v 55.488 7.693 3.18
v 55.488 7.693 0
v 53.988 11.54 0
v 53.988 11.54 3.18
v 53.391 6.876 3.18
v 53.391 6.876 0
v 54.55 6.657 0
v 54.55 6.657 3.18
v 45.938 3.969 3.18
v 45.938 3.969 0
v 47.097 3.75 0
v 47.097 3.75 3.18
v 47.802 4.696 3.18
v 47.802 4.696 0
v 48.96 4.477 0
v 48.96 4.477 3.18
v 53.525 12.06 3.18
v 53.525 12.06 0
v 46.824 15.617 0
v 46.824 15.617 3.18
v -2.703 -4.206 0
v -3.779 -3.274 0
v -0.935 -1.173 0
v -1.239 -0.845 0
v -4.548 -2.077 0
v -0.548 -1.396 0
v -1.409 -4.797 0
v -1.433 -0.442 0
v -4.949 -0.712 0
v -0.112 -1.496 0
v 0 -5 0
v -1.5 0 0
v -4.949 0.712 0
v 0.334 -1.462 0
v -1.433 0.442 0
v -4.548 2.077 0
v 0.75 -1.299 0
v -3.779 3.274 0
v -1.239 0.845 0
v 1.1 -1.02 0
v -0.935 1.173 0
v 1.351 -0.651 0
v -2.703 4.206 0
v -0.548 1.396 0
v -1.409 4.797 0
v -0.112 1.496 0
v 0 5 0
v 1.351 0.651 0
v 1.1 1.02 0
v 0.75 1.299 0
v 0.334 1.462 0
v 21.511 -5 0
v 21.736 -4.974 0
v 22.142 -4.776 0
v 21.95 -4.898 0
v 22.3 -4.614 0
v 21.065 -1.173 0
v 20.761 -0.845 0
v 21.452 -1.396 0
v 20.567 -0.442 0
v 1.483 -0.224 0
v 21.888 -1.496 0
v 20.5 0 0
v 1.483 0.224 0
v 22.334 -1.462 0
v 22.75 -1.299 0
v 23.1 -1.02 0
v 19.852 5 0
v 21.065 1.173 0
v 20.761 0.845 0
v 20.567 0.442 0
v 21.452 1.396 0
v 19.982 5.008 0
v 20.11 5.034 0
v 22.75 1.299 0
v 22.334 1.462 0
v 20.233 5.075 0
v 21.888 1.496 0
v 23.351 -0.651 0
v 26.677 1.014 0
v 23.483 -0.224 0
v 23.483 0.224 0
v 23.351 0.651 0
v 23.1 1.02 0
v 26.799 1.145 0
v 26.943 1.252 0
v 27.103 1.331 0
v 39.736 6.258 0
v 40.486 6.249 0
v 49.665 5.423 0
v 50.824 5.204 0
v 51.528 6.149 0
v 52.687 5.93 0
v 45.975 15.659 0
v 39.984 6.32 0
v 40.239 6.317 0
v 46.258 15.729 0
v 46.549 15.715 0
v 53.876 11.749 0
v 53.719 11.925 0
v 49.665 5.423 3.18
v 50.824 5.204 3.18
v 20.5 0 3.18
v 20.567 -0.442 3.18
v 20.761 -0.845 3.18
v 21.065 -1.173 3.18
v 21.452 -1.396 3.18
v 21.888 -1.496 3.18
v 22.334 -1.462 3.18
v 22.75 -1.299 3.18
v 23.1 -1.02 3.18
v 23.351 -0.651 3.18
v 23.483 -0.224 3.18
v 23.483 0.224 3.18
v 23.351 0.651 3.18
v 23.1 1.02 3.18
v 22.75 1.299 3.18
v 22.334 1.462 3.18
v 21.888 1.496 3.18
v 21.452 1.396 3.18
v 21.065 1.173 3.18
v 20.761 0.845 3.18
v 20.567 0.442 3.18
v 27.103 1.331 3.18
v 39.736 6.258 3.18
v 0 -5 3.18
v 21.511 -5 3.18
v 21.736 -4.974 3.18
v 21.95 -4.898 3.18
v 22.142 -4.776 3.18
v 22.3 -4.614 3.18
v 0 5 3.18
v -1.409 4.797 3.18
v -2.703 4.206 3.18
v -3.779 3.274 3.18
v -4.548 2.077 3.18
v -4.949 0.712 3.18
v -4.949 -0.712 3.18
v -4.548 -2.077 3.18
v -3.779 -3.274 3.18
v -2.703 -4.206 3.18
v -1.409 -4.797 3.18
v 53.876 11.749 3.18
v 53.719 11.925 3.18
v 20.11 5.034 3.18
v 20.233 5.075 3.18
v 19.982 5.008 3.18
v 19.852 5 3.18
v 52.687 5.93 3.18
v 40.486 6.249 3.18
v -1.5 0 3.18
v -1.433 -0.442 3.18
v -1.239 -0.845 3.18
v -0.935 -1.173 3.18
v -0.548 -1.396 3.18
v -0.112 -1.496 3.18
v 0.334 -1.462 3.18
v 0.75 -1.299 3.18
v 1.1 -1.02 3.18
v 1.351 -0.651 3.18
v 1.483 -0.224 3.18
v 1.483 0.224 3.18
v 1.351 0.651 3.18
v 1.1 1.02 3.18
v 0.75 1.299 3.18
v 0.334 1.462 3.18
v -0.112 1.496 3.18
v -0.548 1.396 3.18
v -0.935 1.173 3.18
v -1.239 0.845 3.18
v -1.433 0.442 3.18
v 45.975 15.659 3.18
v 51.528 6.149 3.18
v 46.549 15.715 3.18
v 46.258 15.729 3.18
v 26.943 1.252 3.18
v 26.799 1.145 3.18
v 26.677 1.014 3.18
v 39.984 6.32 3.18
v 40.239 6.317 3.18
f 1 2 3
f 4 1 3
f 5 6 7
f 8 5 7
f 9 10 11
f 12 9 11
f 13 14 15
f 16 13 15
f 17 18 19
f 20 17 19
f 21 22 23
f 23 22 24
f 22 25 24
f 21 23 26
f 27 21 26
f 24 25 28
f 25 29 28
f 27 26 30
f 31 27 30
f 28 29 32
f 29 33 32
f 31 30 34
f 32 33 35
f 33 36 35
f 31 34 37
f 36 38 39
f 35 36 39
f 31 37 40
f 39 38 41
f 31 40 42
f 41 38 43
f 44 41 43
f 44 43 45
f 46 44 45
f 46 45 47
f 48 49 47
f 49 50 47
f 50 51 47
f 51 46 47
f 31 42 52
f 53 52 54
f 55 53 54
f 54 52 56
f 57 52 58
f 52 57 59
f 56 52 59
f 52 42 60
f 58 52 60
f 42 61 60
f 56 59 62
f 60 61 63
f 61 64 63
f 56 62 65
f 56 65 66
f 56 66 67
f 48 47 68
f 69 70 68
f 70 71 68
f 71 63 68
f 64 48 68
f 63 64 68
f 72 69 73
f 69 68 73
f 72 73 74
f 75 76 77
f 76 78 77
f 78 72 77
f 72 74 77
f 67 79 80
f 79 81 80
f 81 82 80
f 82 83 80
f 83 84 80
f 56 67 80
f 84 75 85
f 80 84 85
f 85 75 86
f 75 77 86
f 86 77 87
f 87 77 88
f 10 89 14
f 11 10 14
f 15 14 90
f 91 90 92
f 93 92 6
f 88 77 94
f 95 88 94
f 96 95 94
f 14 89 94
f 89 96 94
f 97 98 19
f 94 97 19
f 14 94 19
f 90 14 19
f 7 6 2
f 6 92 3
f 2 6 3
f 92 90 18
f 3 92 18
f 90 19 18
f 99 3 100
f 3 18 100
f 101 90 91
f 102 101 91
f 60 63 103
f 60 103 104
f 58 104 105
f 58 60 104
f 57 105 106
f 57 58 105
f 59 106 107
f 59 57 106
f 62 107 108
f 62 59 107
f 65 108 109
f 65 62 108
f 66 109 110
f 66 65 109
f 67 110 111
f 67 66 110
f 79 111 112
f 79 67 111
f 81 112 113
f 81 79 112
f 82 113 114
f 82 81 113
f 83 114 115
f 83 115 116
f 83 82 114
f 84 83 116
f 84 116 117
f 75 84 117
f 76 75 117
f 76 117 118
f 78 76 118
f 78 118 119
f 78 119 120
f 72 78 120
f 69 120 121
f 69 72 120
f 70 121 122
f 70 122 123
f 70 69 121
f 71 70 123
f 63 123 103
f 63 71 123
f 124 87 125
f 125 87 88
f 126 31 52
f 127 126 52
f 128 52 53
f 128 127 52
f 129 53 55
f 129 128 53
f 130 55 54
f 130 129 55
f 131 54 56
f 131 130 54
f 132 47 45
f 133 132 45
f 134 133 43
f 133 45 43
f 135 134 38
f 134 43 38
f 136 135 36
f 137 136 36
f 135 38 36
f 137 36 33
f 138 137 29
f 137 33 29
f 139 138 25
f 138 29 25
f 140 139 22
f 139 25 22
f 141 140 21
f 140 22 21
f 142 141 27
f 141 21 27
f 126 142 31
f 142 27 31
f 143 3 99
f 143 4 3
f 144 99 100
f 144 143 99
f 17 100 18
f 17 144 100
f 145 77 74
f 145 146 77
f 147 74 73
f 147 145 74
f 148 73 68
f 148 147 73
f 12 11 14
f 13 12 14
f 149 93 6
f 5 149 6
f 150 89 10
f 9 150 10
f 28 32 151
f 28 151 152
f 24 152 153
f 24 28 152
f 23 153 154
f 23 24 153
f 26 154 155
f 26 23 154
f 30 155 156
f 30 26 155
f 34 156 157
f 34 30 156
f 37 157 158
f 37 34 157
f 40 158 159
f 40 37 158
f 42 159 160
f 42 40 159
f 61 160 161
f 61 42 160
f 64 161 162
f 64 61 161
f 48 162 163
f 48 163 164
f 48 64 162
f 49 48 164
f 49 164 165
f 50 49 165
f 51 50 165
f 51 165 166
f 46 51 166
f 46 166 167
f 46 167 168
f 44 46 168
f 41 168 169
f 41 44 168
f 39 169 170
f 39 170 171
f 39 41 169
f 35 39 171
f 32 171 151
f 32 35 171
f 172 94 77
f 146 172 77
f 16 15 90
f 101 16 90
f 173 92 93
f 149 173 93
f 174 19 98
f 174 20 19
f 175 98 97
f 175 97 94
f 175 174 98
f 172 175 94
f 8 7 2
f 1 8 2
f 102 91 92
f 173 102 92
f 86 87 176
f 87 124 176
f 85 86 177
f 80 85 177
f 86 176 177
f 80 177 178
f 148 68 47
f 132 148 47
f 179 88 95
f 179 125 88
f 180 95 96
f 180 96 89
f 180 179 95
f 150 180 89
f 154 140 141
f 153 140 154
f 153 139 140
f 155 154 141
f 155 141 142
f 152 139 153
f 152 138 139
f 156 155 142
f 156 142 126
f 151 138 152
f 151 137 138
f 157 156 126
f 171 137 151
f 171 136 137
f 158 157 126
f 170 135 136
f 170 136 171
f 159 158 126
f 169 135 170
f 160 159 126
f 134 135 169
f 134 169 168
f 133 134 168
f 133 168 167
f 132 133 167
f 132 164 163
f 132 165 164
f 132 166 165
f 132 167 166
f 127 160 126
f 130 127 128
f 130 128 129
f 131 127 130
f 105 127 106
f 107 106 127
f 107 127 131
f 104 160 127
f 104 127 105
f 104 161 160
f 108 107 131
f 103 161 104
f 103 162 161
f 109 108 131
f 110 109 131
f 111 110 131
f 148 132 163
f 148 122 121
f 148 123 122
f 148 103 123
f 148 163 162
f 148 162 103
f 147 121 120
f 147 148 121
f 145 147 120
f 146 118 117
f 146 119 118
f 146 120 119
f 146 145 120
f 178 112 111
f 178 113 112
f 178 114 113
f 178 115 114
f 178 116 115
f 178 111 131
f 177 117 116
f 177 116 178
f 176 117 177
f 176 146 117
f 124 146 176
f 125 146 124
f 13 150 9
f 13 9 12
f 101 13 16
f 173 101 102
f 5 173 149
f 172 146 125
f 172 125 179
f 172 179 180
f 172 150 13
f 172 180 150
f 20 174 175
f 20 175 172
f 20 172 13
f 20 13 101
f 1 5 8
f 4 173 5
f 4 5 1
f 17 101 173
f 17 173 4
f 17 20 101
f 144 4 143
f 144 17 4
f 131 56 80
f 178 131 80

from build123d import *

# Parameters (mm, degrees)
SKETCH2_R           = 1.5
BOSS_EXTRUDE1_DEPTH = 3.18
FILLET1_R           = 1


with BuildPart() as part:
    # Sketch2 → Boss-Extrude1 (new body)
    # profile 1 of 7: a face of its own
    with BuildSketch(Plane.XY):
        with BuildLine():
            Line((20.05, 5), (0, 5))
            ThreePointArc((0, 5), (-5, 0), (0, -5))
            Line((0, -5), (22, -5))
            Line((22, -5), (26.846033211, 1.231244133))
            ThreePointArc((26.846033211, 1.231244133), (25.069509679, 3.946911493), (22, 5))
            Line((22, 5), (20.05, 5))
        make_face()
        with Locations(Location((0, 0, 0), (0, 0, 180))):
            Circle(SKETCH2_R, mode=Mode.SUBTRACT)
        with Locations(Location((22, 0, 0), (0, 0, 180))):
            Circle(SKETCH2_R, mode=Mode.SUBTRACT)
    # profile 2 of 7: a face of its own
    with BuildSketch(Plane.XY):
        with BuildLine():
            Line((46.409029503, 15.837507263), (20.05, 5))
            Line((20.05, 5), (22, 5))
            ThreePointArc((22, 5), (25.069509679, 3.946911493), (26.846033211, 1.231244133))
            Line((26.846033211, 1.231244133), (40.112794076, 6.40528087))
            Line((40.112794076, 6.40528087), (45.93826156, 3.969125944))
            Line((45.93826156, 3.969125944), (47.80157067, 4.695816497))
            Line((47.80157067, 4.695816497), (49.66487978, 5.42250705))
            Line((49.66487978, 5.42250705), (51.528188891, 6.149197603))
            Line((51.528188891, 6.149197603), (53.391498001, 6.875888156))
            Line((53.391498001, 6.875888156), (55.48772075, 7.693415028))
            Line((55.48772075, 7.693415028), (53.852667005, 11.885860526))
            Line((53.852667005, 11.885860526), (46.409029503, 15.837507263))
        make_face()
    # profile 3 of 7: a face of its own
    with BuildSketch(Plane.XY):
        Polygon((47.80157067, 4.695816497), (45.93826156, 3.969125944), (47.097006913, 3.750187123), align=None)
    # profile 4 of 7: a face of its own
    with BuildSketch(Plane.XY):
        Polygon((49.66487978, 5.42250705), (47.80157067, 4.695816497), (48.960316023, 4.476877676), align=None)
    # profile 5 of 7: a face of its own
    with BuildSketch(Plane.XY):
        Polygon((50.823625133, 5.203568229), (51.528188891, 6.149197603), (49.66487978, 5.42250705), align=None)
    # profile 6 of 7: a face of its own
    with BuildSketch(Plane.XY):
        Polygon((52.686934243, 5.930258782), (53.391498001, 6.875888156), (51.528188891, 6.149197603), align=None)
    # profile 7 of 7: a face of its own
    with BuildSketch(Plane.XY):
        Polygon((54.550243354, 6.656949335), (55.48772075, 7.693415028), (53.391498001, 6.875888156), align=None)
    extrude(amount=BOSS_EXTRUDE1_DEPTH)

    # Fillet1
    fillet1_edges = [part.edges().sort_by_distance(p)[0] for p in [
        (22, -5, 1.59),
        (20.05, 5, 1.59),
        (46.409029503, 15.837507263, 1.59),
        (53.852667005, 11.885860526, 1.59),
        (40.112794076, 6.40528087, 1.59),
        (26.846033211, 1.231244133, 1.59),
    ]]
    fillet(fillet1_edges, radius=FILLET1_R)


solid = part.part
